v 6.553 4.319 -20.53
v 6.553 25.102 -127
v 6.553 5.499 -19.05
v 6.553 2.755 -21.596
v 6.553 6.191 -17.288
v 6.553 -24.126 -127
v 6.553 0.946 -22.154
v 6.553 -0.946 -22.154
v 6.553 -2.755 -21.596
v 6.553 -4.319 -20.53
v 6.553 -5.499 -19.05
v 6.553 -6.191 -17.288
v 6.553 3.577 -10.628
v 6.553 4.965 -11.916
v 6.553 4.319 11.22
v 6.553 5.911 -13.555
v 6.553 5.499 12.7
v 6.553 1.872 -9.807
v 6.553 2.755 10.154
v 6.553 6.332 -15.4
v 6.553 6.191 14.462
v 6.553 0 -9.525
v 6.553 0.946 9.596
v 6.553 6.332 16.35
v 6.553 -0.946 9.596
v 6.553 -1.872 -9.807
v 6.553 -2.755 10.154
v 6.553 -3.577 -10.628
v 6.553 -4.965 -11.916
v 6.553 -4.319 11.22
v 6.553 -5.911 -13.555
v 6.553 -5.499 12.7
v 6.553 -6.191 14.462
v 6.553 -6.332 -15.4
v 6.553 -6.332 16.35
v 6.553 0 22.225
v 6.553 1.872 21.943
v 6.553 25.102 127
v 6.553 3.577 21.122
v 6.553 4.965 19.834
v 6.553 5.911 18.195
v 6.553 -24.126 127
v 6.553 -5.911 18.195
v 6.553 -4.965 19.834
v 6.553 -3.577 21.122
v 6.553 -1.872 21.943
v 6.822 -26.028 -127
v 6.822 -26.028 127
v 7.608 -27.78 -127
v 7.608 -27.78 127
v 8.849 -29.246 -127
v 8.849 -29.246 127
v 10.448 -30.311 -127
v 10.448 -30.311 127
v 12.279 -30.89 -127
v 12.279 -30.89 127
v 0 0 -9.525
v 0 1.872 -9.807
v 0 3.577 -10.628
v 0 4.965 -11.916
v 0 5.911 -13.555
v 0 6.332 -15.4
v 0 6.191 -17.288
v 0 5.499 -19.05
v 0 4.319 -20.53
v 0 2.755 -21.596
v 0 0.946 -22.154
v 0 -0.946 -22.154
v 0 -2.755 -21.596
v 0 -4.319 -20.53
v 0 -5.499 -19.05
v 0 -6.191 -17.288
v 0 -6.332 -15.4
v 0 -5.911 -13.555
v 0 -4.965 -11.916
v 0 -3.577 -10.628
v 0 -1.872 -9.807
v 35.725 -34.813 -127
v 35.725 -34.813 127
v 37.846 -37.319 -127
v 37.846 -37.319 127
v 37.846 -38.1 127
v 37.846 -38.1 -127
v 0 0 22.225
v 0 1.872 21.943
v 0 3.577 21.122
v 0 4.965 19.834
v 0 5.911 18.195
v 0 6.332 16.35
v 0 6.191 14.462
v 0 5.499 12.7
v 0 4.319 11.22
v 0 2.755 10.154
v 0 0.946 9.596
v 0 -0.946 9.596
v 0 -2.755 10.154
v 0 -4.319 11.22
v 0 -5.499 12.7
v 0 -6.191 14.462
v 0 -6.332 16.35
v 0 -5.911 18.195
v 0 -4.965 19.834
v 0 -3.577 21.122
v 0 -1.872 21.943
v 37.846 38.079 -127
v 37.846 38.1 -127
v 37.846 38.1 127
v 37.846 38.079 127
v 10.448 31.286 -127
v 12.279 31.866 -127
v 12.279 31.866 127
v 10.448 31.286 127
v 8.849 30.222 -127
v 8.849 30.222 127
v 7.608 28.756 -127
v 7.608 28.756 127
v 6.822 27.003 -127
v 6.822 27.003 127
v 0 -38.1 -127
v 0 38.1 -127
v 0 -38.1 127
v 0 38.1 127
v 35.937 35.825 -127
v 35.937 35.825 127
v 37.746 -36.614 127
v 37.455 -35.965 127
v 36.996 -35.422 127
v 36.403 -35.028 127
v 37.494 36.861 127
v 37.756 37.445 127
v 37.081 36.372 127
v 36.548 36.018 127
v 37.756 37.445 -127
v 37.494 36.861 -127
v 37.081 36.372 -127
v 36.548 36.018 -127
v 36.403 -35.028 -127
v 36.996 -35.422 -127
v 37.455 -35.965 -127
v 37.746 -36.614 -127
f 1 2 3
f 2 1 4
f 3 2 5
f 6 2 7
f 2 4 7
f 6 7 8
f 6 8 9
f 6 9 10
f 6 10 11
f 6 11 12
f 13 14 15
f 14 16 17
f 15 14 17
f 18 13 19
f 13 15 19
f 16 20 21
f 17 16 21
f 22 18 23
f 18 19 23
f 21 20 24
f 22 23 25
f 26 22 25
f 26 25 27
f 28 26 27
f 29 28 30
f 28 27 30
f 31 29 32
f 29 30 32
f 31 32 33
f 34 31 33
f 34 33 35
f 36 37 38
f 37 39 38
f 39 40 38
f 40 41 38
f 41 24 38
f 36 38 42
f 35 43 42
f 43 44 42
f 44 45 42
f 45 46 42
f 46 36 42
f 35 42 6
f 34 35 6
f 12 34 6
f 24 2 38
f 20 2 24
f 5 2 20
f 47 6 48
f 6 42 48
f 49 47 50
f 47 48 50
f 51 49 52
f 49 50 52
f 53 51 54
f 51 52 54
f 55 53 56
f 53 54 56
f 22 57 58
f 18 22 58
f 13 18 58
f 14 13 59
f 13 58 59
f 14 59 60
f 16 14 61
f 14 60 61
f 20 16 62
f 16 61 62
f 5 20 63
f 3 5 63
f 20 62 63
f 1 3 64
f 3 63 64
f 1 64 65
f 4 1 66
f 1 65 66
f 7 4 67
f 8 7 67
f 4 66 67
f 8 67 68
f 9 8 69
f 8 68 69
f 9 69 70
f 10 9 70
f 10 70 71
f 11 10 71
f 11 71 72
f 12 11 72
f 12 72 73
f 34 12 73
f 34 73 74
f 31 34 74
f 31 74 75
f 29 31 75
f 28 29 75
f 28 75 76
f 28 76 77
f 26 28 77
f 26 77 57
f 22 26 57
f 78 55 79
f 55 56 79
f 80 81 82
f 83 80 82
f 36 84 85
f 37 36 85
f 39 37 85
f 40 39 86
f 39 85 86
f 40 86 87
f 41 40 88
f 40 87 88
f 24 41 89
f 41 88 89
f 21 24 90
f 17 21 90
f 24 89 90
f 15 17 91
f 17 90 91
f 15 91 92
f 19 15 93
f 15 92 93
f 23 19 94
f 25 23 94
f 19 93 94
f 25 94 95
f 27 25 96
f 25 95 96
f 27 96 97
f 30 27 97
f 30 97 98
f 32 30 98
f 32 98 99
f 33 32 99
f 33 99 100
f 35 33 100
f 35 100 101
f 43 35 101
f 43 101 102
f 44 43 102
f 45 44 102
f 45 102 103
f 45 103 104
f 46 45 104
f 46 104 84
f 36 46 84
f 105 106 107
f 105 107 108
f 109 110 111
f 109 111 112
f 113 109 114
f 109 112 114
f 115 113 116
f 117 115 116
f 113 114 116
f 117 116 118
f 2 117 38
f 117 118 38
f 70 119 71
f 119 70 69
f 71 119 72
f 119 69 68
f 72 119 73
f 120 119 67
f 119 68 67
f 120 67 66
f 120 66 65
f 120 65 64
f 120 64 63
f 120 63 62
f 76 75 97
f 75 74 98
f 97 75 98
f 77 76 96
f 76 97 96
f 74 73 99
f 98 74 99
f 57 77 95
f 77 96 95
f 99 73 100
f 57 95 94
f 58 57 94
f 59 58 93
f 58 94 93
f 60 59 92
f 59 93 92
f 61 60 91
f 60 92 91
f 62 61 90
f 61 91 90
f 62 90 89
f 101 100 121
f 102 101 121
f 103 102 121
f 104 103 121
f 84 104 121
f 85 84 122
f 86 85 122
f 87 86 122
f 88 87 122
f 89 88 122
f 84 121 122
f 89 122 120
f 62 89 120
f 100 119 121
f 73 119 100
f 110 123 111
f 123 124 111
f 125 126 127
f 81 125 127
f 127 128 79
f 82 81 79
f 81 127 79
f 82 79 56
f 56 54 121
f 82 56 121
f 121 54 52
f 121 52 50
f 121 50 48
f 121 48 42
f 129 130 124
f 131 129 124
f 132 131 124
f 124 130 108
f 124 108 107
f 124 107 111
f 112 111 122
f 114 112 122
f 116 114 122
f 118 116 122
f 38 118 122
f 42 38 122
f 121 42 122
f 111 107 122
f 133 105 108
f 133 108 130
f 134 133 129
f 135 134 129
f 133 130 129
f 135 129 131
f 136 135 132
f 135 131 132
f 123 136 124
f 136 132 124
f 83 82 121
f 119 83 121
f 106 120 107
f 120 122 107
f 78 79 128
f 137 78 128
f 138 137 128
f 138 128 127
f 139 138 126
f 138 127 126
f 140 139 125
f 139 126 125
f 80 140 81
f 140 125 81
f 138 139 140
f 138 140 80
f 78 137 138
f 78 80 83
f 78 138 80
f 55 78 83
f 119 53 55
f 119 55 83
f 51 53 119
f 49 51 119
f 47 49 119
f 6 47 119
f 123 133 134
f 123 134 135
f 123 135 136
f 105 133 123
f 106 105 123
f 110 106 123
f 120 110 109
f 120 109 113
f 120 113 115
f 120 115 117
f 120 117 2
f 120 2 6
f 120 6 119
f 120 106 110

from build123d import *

# Parameters (mm, degrees)
BOSS_EXTRUDE1_DEPTH = 127
CUT_EXTRUDE1_REACH  = 39.846
SKETCH3_R           = 6.35


with BuildPart() as part:
    # Sketch1 → Boss-Extrude1 (new body, symmetric)
    with BuildSketch(Plane.XY):
        with BuildLine():
            Line((37.846, -38.1), (0, -38.1))
            Line((0, -38.1), (0, 38.1))
            Line((0, 38.1), (37.846, 38.1))
            Line((37.846, 38.1), (37.846, 38.095373852))
            Line((37.846, 38.095373852), (37.846, 38.07919906))
            ThreePointArc((37.846, 38.07919906), (37.304749426, 36.602159643), (35.937298827, 35.824550175))
            Line((35.937298827, 35.824550175), (12.279303519, 31.865559515))
            ThreePointArc((12.279303519, 31.865559515), (8.176951722, 29.532731112), (6.5532, 25.101612859))
            Line((6.5532, 25.101612859), (6.5532, -24.125928831))
            ThreePointArc((6.5532, -24.125928831), (8.176951722, -28.557047083), (12.279303519, -30.889875486))
            Line((12.279303519, -30.889875486), (35.725220919, -34.813376476))
            ThreePointArc((35.725220919, -34.813376476), (37.244610473, -35.677386996), (37.846, -37.318541904))
            Line((37.846, -37.318541904), (37.846, -38.1))
        make_face()
    extrude(amount=BOSS_EXTRUDE1_DEPTH, both=True)

    # Sketch3 → Cut-Extrude1 (cut, up to next)
    with BuildSketch(Plane.ZY, mode=Mode.PRIVATE) as cut_extrude1_sk1:
        with Locations((-15.875, 0)):
            Circle(SKETCH3_R)
    cut_extrude1_tool1 = extrude(cut_extrude1_sk1.sketch, amount=-CUT_EXTRUDE1_REACH, mode=Mode.PRIVATE) & part.part
    add(cut_extrude1_tool1.solids().sort_by_distance((0, 0, -15.875))[0], mode=Mode.SUBTRACT)
    # Sketch3 → Cut-Extrude1 (cut, up to next)
    with BuildSketch(Plane.ZY, mode=Mode.PRIVATE) as cut_extrude1_sk2:
        with Locations((15.875, 0)):
            Circle(SKETCH3_R)
    cut_extrude1_tool2 = extrude(cut_extrude1_sk2.sketch, amount=-CUT_EXTRUDE1_REACH, mode=Mode.PRIVATE) & part.part
    add(cut_extrude1_tool2.solids().sort_by_distance((0, 0, 15.875))[0], mode=Mode.SUBTRACT)


solid = part.part
